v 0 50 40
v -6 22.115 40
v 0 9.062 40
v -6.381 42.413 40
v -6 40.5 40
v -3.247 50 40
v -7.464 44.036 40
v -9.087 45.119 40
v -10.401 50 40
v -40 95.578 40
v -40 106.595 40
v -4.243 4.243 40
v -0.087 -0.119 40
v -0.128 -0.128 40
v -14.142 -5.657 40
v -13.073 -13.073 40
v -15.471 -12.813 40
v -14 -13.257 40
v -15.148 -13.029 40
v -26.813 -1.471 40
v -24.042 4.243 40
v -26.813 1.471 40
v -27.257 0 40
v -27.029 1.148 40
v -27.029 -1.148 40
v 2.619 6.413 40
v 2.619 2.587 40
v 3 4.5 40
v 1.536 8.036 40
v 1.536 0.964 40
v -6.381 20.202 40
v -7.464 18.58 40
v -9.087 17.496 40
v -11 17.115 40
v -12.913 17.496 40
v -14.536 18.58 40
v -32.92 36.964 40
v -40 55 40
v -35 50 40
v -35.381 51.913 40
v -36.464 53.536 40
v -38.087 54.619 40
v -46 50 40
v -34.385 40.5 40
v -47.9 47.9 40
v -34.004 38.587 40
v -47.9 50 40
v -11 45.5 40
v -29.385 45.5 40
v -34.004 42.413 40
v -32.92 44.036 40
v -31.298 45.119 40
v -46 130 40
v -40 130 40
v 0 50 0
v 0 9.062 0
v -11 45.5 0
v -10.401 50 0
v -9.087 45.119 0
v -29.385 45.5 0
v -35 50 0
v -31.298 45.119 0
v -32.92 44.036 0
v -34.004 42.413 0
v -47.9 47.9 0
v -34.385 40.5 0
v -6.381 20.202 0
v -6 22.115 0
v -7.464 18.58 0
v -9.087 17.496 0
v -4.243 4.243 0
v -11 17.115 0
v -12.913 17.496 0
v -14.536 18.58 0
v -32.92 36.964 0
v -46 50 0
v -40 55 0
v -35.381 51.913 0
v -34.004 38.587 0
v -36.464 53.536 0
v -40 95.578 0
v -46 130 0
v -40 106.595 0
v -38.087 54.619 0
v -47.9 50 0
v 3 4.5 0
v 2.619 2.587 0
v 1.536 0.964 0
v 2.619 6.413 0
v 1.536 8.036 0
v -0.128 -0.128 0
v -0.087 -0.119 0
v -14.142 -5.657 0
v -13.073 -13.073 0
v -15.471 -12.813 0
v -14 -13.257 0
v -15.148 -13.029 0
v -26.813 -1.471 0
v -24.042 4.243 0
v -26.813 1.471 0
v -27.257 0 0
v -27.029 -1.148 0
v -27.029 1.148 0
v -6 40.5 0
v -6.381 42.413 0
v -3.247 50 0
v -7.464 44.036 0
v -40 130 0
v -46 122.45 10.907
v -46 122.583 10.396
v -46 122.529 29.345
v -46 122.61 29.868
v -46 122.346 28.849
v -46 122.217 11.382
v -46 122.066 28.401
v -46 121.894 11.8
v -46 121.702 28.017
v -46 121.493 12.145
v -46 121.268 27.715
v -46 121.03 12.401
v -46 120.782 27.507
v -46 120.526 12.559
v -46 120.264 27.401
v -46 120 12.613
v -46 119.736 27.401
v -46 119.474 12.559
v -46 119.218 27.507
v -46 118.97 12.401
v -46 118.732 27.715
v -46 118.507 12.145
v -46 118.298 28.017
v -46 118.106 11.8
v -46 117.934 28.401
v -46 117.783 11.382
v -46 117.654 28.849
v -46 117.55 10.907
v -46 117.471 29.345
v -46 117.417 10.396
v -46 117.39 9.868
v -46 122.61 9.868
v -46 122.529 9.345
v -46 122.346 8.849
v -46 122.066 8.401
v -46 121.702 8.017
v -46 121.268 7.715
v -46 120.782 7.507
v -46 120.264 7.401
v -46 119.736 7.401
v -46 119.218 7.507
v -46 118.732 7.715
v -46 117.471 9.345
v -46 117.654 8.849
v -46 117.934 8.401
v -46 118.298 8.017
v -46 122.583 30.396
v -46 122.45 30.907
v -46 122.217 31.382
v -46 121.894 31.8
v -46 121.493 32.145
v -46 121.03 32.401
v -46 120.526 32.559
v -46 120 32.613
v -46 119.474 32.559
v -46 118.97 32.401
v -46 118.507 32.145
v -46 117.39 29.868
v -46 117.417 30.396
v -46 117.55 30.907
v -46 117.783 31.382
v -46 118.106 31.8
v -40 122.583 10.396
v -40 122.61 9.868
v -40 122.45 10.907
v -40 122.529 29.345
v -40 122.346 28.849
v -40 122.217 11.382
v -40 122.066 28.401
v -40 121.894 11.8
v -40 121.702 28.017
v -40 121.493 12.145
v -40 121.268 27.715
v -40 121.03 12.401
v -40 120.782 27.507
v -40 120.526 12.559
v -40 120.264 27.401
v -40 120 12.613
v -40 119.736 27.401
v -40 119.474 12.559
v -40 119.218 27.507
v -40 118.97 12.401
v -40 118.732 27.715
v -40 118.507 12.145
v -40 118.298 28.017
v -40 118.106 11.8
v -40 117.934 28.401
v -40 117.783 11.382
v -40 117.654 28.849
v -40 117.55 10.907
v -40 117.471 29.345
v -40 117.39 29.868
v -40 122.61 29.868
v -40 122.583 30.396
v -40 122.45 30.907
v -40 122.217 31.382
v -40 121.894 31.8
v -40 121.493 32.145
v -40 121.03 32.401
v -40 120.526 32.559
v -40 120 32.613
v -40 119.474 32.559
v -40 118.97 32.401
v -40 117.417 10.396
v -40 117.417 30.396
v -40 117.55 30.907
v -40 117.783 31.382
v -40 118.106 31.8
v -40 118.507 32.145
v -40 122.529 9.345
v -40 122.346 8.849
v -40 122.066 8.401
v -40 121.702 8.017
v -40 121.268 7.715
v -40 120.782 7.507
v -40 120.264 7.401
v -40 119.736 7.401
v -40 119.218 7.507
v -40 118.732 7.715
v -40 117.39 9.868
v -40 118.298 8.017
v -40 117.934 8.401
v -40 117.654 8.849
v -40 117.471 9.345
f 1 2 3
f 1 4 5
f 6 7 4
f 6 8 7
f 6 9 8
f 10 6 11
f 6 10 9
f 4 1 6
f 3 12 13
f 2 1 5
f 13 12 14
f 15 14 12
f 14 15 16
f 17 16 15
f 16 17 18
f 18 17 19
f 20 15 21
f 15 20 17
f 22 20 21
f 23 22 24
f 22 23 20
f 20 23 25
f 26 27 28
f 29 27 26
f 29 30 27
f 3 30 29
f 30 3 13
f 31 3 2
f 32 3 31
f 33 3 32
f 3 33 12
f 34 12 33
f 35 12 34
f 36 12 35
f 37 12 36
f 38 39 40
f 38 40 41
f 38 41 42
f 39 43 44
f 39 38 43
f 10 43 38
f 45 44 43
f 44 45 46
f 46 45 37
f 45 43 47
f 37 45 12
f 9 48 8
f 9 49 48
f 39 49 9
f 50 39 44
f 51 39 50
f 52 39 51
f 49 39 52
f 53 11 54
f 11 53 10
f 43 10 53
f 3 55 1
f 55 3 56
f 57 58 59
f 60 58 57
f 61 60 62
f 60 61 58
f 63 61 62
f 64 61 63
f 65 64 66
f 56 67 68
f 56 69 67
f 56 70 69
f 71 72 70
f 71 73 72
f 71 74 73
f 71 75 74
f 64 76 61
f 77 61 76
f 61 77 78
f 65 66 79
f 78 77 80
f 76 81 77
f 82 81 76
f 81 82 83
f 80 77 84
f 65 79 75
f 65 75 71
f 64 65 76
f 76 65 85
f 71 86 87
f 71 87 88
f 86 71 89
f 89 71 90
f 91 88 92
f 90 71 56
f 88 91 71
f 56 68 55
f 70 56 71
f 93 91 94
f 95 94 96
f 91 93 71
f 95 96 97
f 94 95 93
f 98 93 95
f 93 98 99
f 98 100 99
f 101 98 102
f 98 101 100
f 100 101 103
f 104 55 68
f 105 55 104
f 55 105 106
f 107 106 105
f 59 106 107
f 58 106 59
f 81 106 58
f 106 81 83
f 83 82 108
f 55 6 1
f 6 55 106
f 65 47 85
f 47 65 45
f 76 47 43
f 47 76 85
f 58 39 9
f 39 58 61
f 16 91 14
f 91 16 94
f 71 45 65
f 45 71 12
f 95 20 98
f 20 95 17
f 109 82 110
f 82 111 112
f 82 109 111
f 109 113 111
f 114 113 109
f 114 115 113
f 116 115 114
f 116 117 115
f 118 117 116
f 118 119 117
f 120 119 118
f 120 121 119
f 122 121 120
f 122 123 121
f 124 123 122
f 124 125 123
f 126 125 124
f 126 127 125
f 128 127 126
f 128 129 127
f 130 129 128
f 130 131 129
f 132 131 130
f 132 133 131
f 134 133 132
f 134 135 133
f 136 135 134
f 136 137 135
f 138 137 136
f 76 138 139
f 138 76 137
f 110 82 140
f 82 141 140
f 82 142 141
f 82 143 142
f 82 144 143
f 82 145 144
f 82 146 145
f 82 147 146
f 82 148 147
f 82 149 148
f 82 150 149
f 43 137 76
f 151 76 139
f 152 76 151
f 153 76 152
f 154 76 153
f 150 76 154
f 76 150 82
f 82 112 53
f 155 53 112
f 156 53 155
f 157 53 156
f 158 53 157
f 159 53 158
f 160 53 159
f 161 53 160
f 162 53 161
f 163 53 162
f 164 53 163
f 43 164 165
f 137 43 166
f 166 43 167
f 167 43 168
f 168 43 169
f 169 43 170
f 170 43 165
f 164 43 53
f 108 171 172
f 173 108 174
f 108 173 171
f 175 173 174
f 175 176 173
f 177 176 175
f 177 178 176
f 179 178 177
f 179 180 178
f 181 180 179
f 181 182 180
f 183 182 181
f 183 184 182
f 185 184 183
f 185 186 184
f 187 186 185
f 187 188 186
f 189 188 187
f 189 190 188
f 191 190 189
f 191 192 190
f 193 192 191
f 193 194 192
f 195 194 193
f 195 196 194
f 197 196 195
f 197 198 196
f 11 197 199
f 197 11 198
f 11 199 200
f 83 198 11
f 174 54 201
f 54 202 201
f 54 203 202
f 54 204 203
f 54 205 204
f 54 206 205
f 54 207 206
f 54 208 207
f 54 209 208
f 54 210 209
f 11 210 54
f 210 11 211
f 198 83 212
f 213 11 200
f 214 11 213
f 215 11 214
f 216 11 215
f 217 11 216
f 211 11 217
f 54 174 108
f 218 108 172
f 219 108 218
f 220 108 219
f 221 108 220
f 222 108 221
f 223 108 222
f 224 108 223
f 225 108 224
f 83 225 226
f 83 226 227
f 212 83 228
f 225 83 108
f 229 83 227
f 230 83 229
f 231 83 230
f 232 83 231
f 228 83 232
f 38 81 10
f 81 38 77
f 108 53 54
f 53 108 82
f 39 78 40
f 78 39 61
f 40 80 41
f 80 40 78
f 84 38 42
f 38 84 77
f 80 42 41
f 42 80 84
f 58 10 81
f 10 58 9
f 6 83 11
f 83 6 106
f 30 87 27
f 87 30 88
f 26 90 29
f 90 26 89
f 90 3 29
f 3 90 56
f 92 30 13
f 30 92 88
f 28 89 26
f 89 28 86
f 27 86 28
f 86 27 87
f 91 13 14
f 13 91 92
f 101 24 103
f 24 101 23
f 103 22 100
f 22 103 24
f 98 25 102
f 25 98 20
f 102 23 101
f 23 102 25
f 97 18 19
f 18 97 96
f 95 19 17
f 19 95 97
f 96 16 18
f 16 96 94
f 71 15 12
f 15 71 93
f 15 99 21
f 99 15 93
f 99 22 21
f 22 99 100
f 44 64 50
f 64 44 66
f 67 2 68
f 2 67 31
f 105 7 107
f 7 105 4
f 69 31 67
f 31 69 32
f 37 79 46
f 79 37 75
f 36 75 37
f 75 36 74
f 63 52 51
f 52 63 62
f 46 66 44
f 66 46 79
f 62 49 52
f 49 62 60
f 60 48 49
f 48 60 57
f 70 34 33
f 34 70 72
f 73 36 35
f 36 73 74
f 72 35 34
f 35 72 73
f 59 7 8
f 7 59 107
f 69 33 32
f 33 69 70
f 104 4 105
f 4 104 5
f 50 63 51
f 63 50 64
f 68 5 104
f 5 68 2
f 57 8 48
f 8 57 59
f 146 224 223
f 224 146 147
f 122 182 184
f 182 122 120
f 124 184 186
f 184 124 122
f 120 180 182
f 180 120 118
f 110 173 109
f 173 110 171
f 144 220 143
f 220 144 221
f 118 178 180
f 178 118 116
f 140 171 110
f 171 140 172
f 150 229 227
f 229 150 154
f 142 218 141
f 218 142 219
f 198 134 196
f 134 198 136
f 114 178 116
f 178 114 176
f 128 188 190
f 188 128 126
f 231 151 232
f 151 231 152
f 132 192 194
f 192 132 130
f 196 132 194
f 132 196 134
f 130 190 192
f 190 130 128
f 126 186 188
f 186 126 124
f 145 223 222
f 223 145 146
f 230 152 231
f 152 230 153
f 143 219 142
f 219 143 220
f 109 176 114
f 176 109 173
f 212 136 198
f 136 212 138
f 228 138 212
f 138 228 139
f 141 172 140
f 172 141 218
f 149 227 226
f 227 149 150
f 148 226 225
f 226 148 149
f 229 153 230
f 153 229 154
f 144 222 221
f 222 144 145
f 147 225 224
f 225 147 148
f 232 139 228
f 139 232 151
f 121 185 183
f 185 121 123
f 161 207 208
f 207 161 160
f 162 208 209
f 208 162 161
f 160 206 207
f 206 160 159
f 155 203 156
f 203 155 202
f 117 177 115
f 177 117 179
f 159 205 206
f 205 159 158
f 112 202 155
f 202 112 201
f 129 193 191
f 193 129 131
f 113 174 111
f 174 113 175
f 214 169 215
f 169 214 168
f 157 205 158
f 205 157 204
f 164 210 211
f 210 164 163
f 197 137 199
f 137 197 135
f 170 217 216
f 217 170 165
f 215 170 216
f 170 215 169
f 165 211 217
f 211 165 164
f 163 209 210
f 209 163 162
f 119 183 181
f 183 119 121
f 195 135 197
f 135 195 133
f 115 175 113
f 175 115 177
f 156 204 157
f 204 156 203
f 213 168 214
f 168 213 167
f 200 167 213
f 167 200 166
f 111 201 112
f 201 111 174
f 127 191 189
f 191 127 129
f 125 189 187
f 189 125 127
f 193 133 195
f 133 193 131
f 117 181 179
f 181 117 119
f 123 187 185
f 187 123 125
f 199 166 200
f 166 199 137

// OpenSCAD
// file: myLibs.scad
pi= 3.14159265359;

module hole(diam, height, clearance= 0.1)
{
        fn= round(diam * pi / 0.5);
        cylinder(h= height, r=diam / 2 / cos(180 / fn) + clearance, $fn=fn);
}

module nutTrap(ffd, faces=6, height=1)
{
	cylinder(h= height, r=ffd / cos(180 / faces) / 2 + 0.05, $fn=faces);
}

// A slot which has rounded ends, but total length is l
module slot(d= 4, l= 8, ht= 1, clearance=0.1) {
	fn= round(d * pi / 0.5);
	rd= d / 2 / cos(180 / fn) + clearance;
	d1= rd*2;
	union() {
		translate([0,0,ht/2]) cube([l-d1, d1, ht], center=true);
		translate([-(l-d1)/2, 0, ht/2]) cylinder(h=ht, r=rd, $fn=fn, center=true); 
		translate([(l-d1)/2, 0, ht/2]) cylinder(h=ht, r=rd, $fn=fn, center=true); 
	}	
}

module nslot(d=4, l= 8, ht=1, clearance=0.1) {
	x= l-(d+clearance);
	hull() {
		translate([x/2, 0, 0])  hole(d, ht, clearance);
		translate([-x/2,0,0]) hole(d,ht, clearance);
	}
}
// main file
use <myLibs.scad>

angle= 90-45;
thick= 6;
backht= 68;
frontht= 26;
slotdepth= 14;
slotthick= slotdepth+thick;
slotht= 20;
verticallength= 45;
offset= 5;
baselength= verticallength+offset;
width= 40;
basewidth= 18;

bracket_extension= 60;

// generate a negative fillet for an edge
module fillet(pos= [0,0,0], radius=3, height=100, fn=16, angle= 0) {
   translate(pos) rotate([0,0,angle]) translate([-radius, -radius, -height/2-0.01])
        difference() {
            cube([radius*2, radius*2, height+0.02]);
            cylinder(r=radius, h=height+0.02, $fn=fn);
        }
}

module cutout(h) {
	sz= 13;
	rotate([0,90,0]) linear_extrude(height=h) {
		hull() {
			circle(r=5);
			translate([sz,sz,0]) circle(r=5);
			translate([-sz,sz,0]) circle(r=5);
		}

	}
}


rotate([0,-90,0])
difference() {
	union() {
		// base
		cube(size=[width, baselength, thick]);
		// back
		translate([0,offset,thick-0.1]) cube(size=[width, verticallength, 42]);
		// block
		rotate([-angle, 0, 0]) translate([0,-slotthick,0]) cube([width,slotthick,backht]);
		// flange
		translate([0,baselength,40]) cube(size=[width, 20+bracket_extension, thick]);
		// flange bolster
		translate([0,baselength,40]) rotate([0, 90, 0])  cylinder(r=5, h=width);
		// flange support
		# translate([0,baselength-5,0]) rotate([33, 0, 0]) cube(size=[width, 20+bracket_extension-6, thick]);

		// bottom bolster
		translate([0,4.5,2]) rotate([0,90,0]) cylinder(r=5, h= width);
	}

	// slots
	rotate([-angle, 0, 0]) translate([-1,-slotdepth,thick]) cube([width+2,slotdepth,backht]);
	rotate([-angle, 0, 0]) translate([-1,-26-10,slotht]) cube([width+2,slotdepth+10,backht]);

	// cutout
	translate([-1,verticallength/2+18,11]) rotate([90+45,0,0]) cutout(width+2);

	//holes
	#translate([width/4,baselength+10+bracket_extension,40-thick/2]) hole(5, thick*2);
	#translate([width*0.75,baselength+10+bracket_extension,40-thick/2]) hole(5, thick*2);

	// translate([width/4-5,baselength+3,40-20]) rotate([90,0,0]) hole(4, thick*2);
	// translate([width*0.75+5,baselength+3,40-20]) rotate([90,0,0]) hole(4, thick*2);

	// fillets
	translate([0,0,28.5]) rotate([0,90,0]) fillet(angle=90+angle);
	translate([0,-14.5,14]) rotate([0,90,0]) fillet(angle=-90-angle);
}
